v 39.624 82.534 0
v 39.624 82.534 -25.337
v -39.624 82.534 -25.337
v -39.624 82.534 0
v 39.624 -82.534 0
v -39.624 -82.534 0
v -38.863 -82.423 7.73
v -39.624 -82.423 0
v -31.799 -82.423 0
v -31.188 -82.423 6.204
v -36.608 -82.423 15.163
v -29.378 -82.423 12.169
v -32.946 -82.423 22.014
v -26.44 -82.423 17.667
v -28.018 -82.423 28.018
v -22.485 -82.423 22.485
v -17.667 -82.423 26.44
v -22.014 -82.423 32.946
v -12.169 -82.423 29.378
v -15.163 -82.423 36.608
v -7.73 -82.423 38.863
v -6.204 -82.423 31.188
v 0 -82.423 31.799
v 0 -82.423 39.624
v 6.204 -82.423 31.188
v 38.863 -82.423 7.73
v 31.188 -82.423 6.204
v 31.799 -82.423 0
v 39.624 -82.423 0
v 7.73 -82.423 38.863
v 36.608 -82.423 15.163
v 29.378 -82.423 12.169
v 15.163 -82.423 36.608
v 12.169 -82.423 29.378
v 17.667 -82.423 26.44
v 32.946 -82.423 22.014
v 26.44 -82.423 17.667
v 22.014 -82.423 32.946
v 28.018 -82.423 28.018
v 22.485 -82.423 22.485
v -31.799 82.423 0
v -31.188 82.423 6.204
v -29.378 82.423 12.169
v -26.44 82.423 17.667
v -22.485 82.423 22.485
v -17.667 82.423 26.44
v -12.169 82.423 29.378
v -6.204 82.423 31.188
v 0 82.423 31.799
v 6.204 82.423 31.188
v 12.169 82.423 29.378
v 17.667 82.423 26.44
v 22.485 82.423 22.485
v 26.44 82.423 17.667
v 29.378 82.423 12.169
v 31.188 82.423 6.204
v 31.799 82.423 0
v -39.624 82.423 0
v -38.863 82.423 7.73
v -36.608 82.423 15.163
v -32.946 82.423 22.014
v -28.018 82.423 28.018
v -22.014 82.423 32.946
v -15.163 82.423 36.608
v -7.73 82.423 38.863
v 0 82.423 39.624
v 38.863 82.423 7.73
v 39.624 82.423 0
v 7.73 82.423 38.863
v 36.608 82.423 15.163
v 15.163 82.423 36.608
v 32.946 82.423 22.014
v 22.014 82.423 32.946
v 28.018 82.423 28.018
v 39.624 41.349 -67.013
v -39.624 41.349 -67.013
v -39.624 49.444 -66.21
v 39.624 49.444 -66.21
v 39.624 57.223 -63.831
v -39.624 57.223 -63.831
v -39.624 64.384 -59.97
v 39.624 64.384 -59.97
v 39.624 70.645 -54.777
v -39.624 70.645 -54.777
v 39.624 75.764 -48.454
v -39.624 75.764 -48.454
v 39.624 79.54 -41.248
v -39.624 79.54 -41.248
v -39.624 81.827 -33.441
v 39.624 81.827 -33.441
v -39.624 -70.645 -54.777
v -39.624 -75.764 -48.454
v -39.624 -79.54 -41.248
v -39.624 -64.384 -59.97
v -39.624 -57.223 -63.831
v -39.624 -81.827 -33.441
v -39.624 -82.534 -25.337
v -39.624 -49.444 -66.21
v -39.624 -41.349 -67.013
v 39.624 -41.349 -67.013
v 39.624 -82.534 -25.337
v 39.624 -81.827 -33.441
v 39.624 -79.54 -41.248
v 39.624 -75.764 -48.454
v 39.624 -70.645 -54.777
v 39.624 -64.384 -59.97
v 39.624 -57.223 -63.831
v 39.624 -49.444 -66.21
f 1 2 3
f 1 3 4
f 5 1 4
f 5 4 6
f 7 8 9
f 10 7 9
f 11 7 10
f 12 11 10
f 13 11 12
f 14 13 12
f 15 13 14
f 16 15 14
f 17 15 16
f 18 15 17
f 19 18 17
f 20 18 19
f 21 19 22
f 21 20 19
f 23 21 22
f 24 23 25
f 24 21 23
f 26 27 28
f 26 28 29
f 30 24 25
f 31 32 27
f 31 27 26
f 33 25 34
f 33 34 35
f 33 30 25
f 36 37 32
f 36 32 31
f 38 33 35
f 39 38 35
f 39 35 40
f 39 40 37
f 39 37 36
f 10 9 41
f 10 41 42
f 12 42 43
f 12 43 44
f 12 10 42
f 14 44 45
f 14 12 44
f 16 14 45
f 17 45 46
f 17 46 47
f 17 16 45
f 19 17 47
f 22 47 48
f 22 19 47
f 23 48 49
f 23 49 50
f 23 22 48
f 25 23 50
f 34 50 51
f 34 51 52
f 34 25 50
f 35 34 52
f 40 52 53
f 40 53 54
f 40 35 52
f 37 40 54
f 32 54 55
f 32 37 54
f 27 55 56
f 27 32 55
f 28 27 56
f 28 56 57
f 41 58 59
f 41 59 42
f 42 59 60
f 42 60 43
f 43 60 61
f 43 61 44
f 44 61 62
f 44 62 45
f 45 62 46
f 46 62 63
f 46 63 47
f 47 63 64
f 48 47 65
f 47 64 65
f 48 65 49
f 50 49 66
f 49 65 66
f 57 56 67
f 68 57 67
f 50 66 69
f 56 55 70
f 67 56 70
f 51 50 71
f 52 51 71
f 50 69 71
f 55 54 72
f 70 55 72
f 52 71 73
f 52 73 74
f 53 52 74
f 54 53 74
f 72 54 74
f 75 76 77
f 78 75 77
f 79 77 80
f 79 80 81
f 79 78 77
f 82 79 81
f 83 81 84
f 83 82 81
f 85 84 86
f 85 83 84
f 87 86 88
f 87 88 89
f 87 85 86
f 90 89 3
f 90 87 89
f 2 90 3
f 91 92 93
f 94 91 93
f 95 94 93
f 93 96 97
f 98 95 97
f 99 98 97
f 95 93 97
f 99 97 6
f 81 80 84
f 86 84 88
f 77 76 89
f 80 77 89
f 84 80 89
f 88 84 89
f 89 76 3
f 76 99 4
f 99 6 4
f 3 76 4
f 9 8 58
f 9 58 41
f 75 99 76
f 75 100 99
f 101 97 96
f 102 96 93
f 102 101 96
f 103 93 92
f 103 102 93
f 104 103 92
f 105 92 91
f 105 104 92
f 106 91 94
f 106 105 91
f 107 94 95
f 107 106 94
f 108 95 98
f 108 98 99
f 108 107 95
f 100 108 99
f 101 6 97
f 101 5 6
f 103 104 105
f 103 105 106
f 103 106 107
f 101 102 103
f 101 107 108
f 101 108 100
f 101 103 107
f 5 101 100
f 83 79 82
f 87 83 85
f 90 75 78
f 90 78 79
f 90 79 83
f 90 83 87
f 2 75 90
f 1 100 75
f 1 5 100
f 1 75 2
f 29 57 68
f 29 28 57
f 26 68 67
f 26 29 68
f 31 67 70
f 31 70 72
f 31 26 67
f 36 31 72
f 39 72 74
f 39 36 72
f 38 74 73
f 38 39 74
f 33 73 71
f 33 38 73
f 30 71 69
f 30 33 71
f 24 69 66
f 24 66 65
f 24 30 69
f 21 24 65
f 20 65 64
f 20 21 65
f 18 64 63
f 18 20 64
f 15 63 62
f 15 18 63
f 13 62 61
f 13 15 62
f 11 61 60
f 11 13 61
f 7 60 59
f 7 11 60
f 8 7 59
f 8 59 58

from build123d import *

# Parameters (mm, degrees)
F1_DEPTH      = 82.423
F1_DEPTH_BACK = 82.423
F3_DEPTH      = 39.624


with BuildPart() as f1:
    # F0 (on Front) → F1 (new body, two sides)
    with BuildSketch(Plane.XZ) as f1_sk:
        with BuildLine():
            Line((39.3192023039, 0), (39.6240018308, 0))
            ThreePointArc((39.6240018308, 0), (0, 39.6240018308), (-39.6240018308, 0))
            Line((-39.6240018308, 0), (-39.3191985786, 0))
            Line((-39.3191985786, 0), (-31.7990560208, 0))
            ThreePointArc((-31.7990560208, 0), (0, 31.7990560208), (31.7990560208, 0))
            Line((31.7990560208, 0), (39.3192023039, 0))
        make_face()
    extrude(amount=F1_DEPTH)
    extrude(f1_sk.sketch, amount=-F1_DEPTH_BACK)


with BuildPart() as f3:
    # F2 (on Right) → F3 (new body, symmetric)
    with BuildSketch(Plane.YZ):
        with BuildLine():
            Line((-41.3485467434, -67.0133009553), (0, -67.0133009553))
            Line((0, -67.0133009553), (41.3485467434, -67.0133009553))
            ThreePointArc((41.3485467434, -67.0133009553), (70.6452529952, -54.7765374968), (82.5344696641, -25.3370758146))
            Line((82.5344696641, -25.3370758146), (82.5344696641, 0))
            Line((82.5344696641, 0), (-82.5344696641, 0))
            Line((-82.5344696641, 0), (-82.5344696641, -25.3370758146))
            ThreePointArc((-82.5344696641, -25.3370758146), (-70.6452529952, -54.7765374968), (-41.3485467434, -67.0133009553))
        make_face()
    extrude(amount=F3_DEPTH, both=True)


solid = Compound([f1.part, f3.part])
